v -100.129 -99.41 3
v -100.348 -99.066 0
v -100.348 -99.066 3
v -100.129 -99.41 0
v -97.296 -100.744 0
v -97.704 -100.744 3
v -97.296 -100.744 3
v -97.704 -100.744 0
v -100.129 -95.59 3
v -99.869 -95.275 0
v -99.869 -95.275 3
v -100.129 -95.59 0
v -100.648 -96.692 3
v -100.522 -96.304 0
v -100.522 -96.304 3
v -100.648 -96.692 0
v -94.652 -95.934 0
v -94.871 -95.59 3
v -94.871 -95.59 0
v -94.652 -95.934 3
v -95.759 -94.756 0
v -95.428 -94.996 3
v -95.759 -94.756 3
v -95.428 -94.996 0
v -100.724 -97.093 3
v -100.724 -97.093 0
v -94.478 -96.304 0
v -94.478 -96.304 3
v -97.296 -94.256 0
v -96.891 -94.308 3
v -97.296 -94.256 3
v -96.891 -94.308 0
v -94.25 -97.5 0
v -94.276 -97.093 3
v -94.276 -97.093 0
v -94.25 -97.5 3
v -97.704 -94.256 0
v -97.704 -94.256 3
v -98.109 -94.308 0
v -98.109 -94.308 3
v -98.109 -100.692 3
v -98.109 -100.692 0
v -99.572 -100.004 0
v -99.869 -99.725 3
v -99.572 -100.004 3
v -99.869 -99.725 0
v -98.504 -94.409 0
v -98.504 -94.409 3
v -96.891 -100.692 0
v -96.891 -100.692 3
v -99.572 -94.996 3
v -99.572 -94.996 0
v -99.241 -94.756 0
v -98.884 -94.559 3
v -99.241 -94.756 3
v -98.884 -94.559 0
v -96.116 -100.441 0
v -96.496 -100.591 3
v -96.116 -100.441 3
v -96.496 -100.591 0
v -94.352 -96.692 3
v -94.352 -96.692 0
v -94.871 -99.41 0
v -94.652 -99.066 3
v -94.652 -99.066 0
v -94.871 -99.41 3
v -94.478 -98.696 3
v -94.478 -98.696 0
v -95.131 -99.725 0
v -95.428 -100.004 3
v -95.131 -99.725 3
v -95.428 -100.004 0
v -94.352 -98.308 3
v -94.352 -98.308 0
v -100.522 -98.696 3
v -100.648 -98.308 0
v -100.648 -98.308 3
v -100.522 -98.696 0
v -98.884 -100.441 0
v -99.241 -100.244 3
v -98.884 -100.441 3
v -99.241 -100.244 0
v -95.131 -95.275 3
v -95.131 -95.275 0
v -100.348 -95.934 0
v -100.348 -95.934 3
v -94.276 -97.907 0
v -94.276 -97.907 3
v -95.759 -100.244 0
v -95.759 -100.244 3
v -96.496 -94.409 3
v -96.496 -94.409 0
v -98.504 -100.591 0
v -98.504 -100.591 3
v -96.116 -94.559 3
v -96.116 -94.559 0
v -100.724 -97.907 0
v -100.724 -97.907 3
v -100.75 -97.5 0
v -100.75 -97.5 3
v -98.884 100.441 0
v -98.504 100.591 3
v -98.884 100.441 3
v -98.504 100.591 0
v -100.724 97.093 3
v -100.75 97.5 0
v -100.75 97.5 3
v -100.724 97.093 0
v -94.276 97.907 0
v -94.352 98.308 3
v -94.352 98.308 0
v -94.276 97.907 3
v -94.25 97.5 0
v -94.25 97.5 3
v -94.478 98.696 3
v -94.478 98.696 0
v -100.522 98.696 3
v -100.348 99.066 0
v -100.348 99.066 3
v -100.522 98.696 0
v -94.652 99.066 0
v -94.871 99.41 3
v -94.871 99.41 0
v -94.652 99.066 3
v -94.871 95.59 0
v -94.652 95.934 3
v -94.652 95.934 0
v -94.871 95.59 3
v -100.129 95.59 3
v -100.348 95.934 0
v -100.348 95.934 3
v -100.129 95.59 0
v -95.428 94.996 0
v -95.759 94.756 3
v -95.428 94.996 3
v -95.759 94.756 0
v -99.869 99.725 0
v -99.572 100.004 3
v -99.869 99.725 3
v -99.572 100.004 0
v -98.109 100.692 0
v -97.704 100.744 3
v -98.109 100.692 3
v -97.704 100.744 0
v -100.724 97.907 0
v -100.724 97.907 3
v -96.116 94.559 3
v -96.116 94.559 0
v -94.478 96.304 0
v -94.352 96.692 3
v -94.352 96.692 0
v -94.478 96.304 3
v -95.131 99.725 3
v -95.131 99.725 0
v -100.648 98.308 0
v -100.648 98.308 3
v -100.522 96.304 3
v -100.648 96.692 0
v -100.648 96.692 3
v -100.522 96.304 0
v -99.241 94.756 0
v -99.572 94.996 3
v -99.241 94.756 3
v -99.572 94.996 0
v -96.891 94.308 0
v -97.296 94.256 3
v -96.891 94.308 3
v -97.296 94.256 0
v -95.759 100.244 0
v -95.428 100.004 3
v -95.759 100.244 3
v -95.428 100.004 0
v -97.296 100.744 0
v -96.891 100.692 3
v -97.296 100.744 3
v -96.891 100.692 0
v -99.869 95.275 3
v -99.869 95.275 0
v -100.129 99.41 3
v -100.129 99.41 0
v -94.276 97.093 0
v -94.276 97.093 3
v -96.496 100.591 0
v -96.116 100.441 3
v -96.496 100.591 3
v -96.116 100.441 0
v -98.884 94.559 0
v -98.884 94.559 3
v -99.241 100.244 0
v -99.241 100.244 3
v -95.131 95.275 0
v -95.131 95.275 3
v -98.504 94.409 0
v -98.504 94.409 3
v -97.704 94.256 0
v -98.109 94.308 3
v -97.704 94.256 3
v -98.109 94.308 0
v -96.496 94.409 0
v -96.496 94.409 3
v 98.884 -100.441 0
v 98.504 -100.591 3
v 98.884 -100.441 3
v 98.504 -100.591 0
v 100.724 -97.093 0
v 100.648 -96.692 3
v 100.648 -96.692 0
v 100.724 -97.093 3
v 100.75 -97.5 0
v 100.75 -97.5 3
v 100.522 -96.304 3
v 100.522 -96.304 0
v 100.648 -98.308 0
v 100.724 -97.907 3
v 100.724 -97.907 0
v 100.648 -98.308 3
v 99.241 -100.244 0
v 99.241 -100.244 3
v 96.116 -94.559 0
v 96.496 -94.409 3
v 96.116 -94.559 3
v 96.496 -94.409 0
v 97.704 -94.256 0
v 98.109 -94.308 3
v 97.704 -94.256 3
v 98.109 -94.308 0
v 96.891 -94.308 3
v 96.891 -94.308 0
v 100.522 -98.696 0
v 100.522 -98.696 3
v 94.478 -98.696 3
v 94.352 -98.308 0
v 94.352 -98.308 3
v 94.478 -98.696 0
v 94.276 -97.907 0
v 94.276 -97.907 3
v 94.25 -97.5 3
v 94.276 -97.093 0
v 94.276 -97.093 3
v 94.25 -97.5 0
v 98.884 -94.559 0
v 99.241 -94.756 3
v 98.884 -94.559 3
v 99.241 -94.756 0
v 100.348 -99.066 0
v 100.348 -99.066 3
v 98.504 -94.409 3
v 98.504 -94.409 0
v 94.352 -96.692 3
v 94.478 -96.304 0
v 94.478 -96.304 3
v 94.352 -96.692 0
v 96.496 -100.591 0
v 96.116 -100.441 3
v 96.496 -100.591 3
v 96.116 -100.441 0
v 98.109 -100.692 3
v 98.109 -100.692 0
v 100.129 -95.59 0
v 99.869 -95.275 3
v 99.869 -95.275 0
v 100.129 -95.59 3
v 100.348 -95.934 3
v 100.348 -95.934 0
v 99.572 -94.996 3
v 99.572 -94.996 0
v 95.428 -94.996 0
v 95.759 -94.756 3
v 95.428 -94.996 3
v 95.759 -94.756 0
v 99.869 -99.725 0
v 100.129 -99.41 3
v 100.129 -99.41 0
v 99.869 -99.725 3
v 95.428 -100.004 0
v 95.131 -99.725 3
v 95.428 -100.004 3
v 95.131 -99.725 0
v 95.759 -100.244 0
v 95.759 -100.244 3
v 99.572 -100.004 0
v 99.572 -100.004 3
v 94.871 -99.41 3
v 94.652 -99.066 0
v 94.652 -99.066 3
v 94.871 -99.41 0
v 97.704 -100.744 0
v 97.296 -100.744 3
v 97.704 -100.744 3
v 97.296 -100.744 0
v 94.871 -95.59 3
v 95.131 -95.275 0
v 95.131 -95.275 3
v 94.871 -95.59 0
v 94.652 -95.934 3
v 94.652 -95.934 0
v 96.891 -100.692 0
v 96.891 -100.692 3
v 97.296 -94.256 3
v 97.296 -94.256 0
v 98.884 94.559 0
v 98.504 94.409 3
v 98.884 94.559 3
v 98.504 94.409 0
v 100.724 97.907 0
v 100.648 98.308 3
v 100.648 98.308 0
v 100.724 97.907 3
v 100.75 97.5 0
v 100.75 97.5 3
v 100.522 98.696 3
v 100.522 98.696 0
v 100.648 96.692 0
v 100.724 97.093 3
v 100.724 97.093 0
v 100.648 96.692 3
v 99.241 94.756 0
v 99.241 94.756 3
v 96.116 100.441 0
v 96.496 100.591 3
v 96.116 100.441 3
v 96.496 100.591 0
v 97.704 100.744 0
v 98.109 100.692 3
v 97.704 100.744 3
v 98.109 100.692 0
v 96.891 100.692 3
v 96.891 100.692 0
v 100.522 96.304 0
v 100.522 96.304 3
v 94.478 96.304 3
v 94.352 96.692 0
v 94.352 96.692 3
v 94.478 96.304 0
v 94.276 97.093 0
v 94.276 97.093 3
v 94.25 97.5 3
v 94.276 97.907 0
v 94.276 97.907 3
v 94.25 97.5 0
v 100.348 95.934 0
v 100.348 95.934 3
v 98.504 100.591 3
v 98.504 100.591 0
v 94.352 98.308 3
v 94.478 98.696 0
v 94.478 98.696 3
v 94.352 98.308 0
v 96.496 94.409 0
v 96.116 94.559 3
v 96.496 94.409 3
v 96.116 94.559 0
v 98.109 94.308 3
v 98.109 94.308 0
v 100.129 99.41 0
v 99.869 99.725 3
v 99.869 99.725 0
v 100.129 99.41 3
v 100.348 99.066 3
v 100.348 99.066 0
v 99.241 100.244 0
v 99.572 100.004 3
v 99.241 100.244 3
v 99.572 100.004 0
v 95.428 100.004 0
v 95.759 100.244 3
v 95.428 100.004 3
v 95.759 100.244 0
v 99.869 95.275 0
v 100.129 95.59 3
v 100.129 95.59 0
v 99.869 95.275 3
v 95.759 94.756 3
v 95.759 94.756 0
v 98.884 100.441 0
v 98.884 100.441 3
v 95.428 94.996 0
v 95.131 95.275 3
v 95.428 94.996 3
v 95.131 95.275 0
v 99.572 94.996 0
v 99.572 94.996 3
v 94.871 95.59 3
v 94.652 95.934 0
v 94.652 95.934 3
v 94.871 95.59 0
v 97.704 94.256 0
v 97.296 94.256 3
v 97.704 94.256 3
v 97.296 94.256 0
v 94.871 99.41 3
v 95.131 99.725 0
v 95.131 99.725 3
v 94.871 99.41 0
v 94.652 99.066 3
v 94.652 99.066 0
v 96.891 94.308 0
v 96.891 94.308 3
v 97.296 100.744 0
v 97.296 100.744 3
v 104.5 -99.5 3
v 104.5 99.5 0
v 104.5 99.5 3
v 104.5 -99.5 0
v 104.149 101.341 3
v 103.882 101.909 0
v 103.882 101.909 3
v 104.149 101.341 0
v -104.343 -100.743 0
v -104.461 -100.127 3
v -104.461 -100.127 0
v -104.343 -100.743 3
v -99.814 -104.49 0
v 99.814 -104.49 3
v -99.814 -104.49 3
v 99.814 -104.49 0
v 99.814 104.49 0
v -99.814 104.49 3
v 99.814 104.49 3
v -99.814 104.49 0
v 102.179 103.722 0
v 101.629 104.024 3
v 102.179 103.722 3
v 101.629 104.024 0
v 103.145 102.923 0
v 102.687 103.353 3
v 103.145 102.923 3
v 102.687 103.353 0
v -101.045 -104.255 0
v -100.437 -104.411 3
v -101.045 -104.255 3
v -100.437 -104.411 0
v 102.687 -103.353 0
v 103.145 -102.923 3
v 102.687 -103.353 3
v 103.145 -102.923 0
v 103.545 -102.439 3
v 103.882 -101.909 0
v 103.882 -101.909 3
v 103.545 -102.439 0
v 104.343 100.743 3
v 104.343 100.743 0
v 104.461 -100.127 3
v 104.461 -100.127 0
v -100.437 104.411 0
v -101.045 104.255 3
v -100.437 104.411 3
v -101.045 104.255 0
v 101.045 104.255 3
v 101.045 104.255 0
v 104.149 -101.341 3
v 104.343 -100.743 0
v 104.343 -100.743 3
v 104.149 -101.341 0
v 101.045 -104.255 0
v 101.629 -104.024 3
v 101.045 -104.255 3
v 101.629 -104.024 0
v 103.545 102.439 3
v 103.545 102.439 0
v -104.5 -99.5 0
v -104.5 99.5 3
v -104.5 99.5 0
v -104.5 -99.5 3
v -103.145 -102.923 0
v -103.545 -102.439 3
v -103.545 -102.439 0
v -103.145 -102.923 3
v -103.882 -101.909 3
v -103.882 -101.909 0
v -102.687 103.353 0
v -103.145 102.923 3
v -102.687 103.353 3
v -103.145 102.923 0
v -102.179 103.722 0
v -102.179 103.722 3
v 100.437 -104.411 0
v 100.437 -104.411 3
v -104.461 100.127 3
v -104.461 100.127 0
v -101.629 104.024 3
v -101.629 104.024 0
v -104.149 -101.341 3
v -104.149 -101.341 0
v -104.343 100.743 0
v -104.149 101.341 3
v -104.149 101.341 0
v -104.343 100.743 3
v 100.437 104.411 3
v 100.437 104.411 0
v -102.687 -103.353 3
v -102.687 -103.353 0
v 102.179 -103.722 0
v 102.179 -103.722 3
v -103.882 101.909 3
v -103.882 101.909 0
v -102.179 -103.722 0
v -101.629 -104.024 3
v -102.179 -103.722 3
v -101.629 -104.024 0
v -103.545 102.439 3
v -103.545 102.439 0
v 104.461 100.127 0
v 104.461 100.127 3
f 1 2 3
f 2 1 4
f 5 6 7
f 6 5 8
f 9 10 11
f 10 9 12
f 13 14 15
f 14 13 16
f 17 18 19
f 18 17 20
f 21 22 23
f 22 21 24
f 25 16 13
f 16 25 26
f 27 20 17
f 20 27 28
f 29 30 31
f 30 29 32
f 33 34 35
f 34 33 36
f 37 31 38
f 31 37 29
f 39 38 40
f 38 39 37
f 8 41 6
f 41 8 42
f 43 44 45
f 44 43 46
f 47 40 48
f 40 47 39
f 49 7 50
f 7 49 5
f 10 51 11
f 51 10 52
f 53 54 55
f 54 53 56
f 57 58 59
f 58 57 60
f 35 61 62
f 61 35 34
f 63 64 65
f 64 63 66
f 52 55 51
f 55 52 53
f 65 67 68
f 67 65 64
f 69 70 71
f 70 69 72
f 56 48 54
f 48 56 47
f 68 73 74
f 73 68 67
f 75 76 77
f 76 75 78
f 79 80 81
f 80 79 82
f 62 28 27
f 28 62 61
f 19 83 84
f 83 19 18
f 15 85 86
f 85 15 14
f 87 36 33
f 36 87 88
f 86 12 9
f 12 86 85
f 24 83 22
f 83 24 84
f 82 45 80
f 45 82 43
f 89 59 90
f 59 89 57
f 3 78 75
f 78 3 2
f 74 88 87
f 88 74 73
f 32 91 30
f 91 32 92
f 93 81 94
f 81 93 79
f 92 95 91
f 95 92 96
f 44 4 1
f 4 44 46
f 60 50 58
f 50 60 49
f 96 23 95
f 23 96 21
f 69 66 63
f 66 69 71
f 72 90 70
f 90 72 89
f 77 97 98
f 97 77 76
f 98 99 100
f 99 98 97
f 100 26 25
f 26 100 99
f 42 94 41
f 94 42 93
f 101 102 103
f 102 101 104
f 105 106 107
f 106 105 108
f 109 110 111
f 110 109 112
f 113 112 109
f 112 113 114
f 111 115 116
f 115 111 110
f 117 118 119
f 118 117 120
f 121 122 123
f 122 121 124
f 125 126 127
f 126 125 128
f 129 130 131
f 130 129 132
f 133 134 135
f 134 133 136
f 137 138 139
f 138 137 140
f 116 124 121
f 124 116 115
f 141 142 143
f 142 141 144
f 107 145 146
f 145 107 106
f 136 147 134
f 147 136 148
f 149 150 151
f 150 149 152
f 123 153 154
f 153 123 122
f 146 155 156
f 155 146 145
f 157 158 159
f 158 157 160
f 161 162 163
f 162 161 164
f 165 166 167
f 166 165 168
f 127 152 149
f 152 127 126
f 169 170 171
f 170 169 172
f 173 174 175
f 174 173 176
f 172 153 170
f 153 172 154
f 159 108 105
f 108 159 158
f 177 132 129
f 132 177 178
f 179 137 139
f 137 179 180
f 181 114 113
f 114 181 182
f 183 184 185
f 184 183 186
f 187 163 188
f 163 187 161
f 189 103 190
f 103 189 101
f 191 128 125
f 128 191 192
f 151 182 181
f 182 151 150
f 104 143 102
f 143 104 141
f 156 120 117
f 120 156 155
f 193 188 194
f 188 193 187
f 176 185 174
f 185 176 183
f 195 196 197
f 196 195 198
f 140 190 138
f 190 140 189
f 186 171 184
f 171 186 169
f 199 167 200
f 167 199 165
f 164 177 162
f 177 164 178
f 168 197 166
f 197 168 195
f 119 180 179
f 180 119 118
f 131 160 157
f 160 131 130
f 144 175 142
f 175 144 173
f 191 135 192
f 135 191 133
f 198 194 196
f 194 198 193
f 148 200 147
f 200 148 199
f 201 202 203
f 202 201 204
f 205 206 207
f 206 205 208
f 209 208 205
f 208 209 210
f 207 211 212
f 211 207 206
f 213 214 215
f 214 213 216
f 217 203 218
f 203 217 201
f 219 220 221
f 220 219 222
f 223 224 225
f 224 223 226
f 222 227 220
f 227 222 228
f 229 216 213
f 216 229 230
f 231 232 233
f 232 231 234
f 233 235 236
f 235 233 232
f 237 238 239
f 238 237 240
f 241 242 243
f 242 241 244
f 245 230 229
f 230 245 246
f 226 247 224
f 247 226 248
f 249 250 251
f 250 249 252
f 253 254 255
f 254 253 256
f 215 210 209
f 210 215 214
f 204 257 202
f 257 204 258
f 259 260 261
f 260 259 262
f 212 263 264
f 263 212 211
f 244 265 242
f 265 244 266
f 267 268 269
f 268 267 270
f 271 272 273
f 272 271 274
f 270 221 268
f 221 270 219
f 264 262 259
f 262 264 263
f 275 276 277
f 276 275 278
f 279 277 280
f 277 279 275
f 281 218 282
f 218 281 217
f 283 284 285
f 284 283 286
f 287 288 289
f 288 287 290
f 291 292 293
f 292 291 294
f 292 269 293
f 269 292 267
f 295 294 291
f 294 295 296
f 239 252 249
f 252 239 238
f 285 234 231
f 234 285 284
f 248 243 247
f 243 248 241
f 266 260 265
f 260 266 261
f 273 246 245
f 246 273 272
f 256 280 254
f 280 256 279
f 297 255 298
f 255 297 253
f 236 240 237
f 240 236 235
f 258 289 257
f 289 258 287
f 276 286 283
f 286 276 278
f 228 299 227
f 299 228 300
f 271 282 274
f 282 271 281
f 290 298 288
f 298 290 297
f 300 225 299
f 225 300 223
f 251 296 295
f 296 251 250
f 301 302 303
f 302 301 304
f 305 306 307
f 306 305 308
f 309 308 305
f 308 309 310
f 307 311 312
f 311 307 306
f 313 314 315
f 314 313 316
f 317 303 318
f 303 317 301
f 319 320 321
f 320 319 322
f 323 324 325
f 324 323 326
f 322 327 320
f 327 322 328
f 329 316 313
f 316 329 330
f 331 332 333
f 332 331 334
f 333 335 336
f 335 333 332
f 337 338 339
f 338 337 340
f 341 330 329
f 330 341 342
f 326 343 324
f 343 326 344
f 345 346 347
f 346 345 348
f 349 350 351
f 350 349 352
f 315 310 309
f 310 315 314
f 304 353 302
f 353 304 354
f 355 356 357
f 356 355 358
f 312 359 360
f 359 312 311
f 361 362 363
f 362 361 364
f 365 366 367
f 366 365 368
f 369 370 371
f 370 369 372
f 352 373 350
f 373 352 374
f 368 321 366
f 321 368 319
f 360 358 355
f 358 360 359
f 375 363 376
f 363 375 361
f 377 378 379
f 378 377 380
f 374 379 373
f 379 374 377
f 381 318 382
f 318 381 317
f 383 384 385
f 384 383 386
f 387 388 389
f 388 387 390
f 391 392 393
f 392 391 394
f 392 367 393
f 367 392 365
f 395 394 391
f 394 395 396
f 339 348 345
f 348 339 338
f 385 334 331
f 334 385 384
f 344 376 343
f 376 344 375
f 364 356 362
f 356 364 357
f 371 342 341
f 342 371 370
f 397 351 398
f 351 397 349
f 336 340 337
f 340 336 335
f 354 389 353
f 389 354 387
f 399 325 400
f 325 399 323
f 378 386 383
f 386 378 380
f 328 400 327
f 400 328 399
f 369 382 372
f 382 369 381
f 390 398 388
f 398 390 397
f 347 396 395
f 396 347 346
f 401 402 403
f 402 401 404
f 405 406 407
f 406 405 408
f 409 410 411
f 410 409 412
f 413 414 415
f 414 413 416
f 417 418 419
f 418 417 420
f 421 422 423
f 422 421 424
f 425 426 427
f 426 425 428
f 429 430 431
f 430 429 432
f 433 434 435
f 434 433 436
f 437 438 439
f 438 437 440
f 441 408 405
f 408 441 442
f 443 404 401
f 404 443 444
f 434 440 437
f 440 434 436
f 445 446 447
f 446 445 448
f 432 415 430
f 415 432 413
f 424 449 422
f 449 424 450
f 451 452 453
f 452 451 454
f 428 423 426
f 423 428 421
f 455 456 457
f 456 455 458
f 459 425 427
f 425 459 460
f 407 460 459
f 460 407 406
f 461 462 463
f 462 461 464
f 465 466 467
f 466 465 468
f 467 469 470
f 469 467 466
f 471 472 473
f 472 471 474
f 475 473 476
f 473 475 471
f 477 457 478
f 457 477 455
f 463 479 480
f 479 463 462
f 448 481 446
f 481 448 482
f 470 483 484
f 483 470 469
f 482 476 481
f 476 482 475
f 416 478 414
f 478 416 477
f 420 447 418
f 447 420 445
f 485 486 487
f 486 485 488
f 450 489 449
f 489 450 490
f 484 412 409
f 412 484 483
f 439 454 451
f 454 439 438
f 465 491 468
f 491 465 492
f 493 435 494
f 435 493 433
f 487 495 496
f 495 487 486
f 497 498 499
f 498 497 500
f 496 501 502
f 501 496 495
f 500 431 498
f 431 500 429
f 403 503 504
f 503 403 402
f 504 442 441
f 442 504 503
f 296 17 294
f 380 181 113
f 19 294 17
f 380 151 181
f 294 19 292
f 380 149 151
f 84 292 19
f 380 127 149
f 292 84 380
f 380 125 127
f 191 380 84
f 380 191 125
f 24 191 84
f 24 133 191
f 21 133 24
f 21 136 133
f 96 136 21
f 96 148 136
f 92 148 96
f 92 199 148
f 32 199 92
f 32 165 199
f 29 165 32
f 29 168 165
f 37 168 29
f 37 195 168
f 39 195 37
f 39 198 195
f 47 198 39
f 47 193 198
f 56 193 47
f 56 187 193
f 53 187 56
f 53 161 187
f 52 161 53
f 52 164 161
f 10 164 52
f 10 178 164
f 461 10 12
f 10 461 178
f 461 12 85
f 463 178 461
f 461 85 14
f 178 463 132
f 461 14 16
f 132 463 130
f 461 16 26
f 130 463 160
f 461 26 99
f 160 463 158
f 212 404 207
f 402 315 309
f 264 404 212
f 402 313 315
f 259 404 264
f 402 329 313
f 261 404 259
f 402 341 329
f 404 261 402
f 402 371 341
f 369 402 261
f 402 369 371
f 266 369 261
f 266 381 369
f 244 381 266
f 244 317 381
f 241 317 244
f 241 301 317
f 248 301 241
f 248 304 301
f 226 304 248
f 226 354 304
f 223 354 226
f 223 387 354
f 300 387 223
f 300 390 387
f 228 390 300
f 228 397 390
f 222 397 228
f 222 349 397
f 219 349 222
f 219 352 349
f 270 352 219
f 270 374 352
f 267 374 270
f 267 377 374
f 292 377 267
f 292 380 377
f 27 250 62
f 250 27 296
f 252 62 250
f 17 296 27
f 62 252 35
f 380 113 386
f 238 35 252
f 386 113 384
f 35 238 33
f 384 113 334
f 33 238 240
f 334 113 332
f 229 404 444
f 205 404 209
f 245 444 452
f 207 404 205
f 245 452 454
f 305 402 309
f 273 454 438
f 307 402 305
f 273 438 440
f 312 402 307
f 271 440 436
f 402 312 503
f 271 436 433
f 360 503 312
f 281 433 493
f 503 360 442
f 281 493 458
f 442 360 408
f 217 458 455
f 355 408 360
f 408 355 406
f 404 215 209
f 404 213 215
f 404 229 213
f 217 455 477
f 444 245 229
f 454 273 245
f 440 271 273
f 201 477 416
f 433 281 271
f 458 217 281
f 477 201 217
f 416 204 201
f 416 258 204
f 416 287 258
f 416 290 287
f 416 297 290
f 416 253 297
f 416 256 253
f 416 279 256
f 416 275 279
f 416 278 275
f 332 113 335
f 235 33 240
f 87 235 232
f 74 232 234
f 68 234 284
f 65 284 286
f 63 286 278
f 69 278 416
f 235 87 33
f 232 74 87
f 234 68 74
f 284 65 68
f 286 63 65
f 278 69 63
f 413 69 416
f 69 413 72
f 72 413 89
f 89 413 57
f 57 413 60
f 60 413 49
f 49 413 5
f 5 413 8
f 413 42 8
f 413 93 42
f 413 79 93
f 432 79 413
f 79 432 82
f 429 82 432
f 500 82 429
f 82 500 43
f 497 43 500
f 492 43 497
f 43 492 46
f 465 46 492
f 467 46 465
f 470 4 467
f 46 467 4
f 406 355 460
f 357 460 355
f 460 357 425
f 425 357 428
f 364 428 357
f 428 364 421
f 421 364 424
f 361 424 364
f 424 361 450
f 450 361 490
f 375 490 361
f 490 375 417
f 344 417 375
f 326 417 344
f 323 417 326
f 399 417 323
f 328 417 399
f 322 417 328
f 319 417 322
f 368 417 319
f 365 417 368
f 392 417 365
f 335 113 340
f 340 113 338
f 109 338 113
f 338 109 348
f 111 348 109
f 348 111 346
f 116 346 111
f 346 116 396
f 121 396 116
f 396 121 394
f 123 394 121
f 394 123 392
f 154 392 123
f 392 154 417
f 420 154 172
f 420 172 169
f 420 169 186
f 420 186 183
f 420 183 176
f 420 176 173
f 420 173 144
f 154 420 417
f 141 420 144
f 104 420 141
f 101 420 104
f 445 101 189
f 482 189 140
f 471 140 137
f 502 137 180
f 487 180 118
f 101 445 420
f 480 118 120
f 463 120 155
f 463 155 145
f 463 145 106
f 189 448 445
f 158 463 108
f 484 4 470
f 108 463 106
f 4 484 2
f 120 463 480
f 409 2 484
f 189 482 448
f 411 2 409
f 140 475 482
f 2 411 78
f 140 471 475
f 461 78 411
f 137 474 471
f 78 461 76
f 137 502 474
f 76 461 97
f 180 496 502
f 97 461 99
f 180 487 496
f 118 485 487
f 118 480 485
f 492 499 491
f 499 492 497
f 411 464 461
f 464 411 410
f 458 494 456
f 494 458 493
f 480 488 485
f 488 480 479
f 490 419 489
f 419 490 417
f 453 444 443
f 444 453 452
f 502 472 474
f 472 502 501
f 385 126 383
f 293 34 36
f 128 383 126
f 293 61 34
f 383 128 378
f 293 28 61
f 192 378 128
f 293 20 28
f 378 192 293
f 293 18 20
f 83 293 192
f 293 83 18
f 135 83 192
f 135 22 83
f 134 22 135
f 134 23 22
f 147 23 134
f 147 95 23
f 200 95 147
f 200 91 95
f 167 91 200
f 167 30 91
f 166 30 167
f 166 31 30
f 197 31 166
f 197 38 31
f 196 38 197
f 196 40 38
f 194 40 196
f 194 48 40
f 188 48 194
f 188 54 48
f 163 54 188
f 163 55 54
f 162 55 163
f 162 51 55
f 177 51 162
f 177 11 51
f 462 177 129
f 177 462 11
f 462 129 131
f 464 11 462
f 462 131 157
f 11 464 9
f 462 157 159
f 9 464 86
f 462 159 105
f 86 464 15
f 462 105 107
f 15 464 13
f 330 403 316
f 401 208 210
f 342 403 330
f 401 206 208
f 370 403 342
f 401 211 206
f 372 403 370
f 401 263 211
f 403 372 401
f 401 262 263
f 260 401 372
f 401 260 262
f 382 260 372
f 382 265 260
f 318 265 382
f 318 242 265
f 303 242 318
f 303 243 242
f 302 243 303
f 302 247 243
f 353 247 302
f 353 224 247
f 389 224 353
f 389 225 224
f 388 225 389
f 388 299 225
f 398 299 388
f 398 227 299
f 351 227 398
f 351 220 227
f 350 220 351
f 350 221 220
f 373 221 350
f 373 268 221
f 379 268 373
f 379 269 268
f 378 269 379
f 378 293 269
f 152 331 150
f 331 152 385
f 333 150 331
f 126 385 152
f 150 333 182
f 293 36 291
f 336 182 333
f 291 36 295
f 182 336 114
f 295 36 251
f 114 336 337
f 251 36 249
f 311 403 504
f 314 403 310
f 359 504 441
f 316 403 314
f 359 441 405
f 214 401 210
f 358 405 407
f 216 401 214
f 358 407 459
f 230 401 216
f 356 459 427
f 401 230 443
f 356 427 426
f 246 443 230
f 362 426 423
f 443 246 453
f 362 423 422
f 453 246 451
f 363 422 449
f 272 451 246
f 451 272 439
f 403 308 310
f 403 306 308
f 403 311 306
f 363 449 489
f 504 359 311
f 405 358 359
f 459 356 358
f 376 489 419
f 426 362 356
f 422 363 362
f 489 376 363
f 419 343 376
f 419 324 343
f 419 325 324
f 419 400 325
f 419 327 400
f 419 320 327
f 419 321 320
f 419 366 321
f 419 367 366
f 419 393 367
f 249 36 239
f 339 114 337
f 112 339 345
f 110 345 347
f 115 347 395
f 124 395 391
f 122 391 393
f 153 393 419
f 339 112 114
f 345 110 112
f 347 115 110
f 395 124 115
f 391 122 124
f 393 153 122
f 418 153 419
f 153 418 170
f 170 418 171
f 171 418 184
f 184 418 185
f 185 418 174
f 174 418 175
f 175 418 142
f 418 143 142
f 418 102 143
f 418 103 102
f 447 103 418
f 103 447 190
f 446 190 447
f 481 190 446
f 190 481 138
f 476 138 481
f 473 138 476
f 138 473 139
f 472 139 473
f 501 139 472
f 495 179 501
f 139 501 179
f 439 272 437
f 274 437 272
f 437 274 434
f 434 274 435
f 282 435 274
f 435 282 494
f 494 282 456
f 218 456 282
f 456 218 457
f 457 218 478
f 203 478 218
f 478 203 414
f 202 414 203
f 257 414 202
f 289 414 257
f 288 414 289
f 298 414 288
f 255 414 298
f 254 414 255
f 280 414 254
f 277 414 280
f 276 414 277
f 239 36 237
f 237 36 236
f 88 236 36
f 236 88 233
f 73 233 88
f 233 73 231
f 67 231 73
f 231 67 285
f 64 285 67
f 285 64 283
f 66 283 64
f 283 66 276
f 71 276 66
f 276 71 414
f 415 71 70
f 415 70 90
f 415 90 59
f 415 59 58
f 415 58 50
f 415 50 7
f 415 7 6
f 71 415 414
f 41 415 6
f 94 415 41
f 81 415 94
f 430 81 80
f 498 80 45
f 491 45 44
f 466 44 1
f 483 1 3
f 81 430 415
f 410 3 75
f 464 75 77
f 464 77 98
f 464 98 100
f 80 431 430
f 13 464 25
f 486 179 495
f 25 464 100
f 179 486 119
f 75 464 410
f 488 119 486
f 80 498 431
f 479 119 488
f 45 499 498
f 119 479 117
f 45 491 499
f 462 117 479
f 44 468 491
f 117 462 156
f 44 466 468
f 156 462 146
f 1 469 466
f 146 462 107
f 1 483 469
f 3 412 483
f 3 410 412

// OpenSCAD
$fn = 50;


difference() {
	union() {
		hull() {
			translate(v = [-99.5000000000, 99.5000000000, 0]) {
				cylinder(h = 3, r = 5);
			}
			translate(v = [99.5000000000, 99.5000000000, 0]) {
				cylinder(h = 3, r = 5);
			}
			translate(v = [-99.5000000000, -99.5000000000, 0]) {
				cylinder(h = 3, r = 5);
			}
			translate(v = [99.5000000000, -99.5000000000, 0]) {
				cylinder(h = 3, r = 5);
			}
		}
	}
	union() {
		translate(v = [-97.5000000000, -97.5000000000, -100.0000000000]) {
			cylinder(h = 200, r = 3.2500000000);
		}
		translate(v = [-97.5000000000, 97.5000000000, -100.0000000000]) {
			cylinder(h = 200, r = 3.2500000000);
		}
		translate(v = [97.5000000000, -97.5000000000, -100.0000000000]) {
			cylinder(h = 200, r = 3.2500000000);
		}
		translate(v = [97.5000000000, 97.5000000000, -100.0000000000]) {
			cylinder(h = 200, r = 3.2500000000);
		}
	}
}
